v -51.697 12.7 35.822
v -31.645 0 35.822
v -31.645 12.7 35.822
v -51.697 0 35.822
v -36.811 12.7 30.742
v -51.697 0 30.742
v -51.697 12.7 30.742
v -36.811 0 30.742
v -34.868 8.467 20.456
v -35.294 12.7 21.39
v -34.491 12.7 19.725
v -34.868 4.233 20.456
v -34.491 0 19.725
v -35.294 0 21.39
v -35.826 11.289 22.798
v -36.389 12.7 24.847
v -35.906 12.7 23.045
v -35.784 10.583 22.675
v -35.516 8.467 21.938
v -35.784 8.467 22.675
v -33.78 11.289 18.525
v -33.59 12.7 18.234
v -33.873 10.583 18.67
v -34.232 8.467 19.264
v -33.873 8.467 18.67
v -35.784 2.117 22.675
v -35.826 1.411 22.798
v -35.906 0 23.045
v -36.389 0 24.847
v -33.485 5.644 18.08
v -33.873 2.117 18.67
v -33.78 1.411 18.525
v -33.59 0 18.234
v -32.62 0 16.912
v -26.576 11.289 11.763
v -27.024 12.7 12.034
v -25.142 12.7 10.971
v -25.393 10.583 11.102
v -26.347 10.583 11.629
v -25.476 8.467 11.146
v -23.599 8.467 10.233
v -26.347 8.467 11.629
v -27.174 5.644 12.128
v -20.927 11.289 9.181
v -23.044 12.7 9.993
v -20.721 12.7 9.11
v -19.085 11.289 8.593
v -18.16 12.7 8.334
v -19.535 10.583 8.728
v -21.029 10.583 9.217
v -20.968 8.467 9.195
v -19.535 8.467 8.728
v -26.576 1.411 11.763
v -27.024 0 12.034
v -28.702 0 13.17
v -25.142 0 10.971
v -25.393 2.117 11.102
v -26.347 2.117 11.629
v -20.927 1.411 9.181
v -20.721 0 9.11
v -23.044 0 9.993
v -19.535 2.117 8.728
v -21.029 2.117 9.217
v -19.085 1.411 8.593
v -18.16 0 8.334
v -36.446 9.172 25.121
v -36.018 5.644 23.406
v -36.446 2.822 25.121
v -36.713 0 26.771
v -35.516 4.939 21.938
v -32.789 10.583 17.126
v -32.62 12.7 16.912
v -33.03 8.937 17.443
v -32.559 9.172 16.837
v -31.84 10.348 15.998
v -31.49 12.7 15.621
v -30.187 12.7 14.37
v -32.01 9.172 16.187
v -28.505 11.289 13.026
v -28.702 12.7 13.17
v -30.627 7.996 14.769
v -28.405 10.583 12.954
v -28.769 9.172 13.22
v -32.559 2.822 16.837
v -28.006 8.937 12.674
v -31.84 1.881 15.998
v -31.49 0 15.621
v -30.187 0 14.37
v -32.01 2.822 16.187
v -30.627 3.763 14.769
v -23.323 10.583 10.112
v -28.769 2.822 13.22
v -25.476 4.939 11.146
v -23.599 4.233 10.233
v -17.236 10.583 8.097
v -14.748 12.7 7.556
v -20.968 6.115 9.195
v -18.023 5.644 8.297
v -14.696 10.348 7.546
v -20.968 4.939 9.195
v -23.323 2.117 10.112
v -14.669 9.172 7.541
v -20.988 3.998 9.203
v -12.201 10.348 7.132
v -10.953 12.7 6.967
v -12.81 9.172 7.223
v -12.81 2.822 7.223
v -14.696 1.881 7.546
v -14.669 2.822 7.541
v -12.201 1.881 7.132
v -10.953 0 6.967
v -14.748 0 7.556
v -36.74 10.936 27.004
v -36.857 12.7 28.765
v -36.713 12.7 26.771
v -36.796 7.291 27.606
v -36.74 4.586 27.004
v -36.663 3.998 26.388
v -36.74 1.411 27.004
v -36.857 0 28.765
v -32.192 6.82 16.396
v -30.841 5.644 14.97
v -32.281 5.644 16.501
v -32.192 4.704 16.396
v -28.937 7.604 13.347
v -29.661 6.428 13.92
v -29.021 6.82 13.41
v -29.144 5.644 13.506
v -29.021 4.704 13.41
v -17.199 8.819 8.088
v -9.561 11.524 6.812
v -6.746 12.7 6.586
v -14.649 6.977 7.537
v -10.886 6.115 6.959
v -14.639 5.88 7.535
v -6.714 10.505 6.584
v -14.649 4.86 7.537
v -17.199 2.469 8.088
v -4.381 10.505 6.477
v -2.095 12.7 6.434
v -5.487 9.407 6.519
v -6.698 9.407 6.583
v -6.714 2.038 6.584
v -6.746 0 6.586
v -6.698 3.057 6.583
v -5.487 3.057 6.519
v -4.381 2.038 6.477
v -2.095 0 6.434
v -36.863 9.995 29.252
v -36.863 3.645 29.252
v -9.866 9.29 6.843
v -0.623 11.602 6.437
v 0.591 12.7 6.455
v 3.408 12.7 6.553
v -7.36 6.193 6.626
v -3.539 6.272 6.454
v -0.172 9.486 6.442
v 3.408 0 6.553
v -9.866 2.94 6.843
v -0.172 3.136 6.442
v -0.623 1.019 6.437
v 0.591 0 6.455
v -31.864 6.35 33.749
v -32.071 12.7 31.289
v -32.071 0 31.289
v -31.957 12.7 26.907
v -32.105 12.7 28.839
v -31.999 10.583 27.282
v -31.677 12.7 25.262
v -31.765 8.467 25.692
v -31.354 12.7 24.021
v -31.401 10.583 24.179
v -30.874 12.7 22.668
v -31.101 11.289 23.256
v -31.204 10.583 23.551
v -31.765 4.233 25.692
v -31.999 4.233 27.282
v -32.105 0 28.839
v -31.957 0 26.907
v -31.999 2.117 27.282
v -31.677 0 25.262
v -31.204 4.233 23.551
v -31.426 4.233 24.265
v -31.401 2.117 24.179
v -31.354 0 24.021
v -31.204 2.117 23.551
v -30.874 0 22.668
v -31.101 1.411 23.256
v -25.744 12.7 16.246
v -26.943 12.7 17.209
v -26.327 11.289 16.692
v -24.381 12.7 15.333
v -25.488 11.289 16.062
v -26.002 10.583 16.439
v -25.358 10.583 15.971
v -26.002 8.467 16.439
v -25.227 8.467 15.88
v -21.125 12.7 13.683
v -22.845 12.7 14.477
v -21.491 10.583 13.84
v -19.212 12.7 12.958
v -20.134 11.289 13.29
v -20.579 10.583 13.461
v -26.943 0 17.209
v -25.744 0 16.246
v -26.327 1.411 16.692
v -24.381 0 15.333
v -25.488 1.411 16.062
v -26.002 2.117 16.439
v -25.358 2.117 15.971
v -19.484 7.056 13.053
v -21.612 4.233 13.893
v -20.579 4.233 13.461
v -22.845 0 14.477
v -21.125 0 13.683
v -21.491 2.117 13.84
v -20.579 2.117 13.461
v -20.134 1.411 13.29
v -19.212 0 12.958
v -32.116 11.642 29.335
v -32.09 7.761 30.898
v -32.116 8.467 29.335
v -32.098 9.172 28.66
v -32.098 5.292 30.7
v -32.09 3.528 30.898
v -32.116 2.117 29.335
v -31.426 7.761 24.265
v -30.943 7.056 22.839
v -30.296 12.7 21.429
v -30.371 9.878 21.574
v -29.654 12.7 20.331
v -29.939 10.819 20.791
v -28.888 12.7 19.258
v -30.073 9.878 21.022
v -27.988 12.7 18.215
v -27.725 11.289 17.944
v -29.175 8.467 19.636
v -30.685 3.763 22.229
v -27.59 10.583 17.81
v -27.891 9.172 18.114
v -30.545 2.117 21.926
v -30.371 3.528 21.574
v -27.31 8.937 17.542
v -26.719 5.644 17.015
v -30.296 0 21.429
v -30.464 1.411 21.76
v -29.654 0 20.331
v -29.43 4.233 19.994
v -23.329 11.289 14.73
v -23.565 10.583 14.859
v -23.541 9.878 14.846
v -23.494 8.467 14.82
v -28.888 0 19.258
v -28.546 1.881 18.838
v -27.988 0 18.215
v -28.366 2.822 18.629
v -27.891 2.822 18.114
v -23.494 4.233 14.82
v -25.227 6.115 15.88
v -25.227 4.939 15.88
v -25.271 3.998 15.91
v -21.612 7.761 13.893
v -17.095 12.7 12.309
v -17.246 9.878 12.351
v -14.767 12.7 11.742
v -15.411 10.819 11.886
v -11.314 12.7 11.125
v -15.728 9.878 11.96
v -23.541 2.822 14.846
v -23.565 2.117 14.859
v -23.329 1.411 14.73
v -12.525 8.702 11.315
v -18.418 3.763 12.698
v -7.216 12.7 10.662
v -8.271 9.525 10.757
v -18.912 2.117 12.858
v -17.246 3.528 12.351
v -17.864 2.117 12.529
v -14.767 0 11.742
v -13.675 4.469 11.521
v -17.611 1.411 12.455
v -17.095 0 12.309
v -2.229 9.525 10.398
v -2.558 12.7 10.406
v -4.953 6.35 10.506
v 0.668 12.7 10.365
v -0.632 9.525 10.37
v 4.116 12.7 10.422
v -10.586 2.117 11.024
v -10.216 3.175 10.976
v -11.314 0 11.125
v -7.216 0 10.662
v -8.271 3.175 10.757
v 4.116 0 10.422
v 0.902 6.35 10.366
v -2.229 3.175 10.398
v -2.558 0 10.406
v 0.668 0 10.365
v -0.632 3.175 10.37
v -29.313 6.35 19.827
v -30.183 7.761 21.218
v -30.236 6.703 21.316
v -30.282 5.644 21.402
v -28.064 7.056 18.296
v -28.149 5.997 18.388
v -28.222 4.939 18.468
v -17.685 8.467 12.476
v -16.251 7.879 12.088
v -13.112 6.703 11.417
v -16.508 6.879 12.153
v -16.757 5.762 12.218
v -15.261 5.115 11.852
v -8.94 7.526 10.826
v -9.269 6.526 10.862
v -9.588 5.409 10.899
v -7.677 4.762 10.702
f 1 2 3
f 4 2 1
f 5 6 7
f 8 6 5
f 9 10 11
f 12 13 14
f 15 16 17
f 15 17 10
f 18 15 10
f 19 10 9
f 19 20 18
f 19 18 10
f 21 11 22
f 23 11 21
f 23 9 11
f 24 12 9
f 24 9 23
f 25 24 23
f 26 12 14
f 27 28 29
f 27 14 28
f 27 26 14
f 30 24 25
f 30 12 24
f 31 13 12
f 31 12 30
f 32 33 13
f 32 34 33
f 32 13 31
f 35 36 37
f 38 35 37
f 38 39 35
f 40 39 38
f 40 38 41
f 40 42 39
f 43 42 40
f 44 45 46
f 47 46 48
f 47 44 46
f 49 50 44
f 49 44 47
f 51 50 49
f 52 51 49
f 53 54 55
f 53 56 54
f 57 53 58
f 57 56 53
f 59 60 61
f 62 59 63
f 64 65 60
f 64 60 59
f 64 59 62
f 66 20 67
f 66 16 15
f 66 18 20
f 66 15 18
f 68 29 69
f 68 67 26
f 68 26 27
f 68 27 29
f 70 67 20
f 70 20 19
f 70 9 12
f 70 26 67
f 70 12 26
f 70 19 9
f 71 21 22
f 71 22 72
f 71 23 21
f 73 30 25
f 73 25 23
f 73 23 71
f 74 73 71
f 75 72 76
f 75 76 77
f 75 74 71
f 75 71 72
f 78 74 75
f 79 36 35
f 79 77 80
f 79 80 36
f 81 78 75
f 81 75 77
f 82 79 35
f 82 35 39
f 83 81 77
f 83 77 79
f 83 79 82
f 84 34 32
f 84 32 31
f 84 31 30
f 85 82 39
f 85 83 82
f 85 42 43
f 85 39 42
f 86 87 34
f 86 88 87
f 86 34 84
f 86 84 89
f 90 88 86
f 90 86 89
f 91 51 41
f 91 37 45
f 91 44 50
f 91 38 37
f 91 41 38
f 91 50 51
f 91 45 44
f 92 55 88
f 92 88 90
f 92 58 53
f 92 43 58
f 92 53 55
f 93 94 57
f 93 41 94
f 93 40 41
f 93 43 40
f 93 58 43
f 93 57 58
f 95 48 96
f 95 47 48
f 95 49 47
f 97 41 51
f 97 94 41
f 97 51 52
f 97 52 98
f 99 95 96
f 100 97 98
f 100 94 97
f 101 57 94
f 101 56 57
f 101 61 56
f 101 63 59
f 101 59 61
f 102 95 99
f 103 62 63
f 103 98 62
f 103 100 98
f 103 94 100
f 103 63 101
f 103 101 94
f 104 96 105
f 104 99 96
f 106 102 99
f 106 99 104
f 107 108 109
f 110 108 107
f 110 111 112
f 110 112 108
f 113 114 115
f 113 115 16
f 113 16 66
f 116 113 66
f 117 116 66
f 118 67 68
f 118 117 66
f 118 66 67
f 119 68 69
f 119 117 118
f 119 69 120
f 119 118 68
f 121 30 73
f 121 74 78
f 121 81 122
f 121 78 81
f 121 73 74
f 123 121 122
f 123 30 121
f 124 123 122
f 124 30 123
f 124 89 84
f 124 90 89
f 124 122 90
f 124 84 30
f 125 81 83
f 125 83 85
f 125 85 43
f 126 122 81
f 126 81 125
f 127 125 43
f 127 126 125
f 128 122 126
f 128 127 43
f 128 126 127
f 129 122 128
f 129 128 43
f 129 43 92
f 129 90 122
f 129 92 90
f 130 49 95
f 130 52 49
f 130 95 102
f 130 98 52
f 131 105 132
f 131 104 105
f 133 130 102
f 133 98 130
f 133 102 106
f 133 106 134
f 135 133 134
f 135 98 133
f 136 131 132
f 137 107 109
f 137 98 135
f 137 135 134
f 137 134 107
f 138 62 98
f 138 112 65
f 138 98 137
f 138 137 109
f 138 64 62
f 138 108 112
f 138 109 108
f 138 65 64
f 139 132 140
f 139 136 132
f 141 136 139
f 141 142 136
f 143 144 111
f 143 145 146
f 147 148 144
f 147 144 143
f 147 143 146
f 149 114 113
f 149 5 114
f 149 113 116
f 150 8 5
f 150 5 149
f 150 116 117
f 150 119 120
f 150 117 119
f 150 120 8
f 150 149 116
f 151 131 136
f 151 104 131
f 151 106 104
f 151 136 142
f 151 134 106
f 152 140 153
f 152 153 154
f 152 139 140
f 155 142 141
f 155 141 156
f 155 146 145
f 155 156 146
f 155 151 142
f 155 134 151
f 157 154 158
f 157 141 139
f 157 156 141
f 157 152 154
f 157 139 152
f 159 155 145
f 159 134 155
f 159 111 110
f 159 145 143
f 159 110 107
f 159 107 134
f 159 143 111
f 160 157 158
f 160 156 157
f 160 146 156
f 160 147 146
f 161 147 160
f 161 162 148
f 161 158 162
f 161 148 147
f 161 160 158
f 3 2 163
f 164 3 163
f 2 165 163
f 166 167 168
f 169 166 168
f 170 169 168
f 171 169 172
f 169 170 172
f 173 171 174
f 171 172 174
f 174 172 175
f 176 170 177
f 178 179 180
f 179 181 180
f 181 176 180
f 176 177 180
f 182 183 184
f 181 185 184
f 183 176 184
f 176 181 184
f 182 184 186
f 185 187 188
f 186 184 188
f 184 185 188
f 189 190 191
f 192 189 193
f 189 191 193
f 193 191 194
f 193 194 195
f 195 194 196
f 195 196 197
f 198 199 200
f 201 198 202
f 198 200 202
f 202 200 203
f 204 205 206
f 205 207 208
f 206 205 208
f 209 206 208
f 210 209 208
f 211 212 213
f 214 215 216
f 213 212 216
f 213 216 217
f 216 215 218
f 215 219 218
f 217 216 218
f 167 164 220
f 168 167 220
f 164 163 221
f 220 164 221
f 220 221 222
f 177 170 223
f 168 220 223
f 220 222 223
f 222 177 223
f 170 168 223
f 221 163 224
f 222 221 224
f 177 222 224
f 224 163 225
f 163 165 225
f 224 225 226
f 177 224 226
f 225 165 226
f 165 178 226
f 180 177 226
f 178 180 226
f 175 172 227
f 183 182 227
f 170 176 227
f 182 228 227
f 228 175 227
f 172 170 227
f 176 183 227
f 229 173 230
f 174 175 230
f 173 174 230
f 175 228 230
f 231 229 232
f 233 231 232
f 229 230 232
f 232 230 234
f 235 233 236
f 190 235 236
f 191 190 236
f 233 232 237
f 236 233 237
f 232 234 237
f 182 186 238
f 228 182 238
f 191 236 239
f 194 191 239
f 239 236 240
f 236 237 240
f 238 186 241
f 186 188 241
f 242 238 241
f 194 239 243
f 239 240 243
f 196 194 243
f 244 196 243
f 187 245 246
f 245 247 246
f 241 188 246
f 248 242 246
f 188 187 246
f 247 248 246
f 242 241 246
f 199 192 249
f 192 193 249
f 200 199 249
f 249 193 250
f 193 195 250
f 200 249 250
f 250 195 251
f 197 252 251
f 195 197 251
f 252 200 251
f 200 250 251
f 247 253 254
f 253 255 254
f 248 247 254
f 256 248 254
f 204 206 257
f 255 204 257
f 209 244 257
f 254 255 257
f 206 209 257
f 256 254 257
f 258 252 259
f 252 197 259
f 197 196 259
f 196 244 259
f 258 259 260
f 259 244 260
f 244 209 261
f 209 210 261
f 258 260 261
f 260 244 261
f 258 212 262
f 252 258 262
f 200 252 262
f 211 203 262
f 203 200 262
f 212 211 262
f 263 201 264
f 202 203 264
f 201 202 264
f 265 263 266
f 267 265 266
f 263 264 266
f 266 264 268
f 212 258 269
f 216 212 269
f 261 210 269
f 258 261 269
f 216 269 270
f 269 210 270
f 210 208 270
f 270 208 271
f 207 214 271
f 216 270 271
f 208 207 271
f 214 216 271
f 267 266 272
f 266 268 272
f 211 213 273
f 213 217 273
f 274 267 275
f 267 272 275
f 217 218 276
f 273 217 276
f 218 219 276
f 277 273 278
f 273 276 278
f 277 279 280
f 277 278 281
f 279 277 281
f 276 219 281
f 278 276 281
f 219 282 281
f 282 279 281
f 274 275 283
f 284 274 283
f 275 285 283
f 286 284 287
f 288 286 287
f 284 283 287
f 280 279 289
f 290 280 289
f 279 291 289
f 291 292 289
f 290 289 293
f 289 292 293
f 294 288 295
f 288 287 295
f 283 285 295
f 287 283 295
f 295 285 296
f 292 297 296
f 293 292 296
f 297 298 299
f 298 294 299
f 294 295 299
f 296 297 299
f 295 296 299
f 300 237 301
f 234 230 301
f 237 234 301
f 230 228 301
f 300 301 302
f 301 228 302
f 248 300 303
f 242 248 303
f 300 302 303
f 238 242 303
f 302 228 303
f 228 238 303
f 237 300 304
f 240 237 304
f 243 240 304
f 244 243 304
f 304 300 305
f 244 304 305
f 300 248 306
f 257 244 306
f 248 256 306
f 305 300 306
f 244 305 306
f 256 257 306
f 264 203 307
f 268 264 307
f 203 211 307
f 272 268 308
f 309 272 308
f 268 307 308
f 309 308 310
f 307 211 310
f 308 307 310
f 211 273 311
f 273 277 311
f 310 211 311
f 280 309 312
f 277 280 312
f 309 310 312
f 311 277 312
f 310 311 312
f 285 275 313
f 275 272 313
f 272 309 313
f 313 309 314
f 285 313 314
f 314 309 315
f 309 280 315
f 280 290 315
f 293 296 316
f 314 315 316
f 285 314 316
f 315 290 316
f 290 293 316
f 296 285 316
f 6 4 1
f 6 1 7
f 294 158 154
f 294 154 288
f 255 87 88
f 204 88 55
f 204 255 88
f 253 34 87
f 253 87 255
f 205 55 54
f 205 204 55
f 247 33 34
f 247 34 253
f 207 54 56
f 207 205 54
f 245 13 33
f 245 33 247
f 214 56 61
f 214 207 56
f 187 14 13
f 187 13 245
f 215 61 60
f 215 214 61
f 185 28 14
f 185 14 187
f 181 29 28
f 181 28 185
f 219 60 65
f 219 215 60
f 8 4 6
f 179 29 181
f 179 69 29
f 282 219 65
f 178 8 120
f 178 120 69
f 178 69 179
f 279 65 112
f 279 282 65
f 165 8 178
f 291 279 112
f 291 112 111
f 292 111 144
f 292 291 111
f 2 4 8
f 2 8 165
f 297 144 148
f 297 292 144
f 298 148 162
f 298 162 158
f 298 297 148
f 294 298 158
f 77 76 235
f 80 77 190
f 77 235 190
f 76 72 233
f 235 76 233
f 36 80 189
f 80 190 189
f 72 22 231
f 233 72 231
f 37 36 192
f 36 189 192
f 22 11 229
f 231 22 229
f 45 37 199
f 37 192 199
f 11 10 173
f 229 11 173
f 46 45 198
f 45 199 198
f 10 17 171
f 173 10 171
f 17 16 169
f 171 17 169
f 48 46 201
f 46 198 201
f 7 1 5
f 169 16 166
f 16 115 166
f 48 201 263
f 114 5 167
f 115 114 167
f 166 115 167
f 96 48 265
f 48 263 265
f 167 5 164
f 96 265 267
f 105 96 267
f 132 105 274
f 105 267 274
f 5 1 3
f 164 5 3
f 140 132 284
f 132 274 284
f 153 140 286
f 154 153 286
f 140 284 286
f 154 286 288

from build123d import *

# Parameters (mm, degrees)
F1_DEPTH = 12.7


with BuildPart() as f1:
    # F0 (on Front) → F1 (new body)
    with BuildSketch(Plane.XZ):
        with BuildLine():
            Line((-31.644711, 35.822344), (-51.697341, 35.822344))
            Line((-51.697341, 35.822344), (-51.697341, 30.742344))
            Line((-51.697341, 30.742344), (-36.811311, 30.742344))
            add(Edge.make_bspline(
                [(-36.811311, 30.742344), (-37.394196, 22.58198), (-33.605456, 4.804045), (3.407622, 6.552694)],
                knots=[0, 0, 0, 0, 46.932949, 46.932949, 46.932949, 46.932949], degree=3))
            Line((3.407622, 6.552694), (4.115814, 10.422344))
            add(Edge.make_bspline(
                [(-31.644711, 35.822344), (-32.313132, 28.469711), (-36.811311, 9.175669), (4.115814, 10.422344)],
                knots=[0, 0, 0, 0, 43.863141, 43.863141, 43.863141, 43.863141], degree=3))
        make_face()
    extrude(amount=-F1_DEPTH)


solid = f1.part
